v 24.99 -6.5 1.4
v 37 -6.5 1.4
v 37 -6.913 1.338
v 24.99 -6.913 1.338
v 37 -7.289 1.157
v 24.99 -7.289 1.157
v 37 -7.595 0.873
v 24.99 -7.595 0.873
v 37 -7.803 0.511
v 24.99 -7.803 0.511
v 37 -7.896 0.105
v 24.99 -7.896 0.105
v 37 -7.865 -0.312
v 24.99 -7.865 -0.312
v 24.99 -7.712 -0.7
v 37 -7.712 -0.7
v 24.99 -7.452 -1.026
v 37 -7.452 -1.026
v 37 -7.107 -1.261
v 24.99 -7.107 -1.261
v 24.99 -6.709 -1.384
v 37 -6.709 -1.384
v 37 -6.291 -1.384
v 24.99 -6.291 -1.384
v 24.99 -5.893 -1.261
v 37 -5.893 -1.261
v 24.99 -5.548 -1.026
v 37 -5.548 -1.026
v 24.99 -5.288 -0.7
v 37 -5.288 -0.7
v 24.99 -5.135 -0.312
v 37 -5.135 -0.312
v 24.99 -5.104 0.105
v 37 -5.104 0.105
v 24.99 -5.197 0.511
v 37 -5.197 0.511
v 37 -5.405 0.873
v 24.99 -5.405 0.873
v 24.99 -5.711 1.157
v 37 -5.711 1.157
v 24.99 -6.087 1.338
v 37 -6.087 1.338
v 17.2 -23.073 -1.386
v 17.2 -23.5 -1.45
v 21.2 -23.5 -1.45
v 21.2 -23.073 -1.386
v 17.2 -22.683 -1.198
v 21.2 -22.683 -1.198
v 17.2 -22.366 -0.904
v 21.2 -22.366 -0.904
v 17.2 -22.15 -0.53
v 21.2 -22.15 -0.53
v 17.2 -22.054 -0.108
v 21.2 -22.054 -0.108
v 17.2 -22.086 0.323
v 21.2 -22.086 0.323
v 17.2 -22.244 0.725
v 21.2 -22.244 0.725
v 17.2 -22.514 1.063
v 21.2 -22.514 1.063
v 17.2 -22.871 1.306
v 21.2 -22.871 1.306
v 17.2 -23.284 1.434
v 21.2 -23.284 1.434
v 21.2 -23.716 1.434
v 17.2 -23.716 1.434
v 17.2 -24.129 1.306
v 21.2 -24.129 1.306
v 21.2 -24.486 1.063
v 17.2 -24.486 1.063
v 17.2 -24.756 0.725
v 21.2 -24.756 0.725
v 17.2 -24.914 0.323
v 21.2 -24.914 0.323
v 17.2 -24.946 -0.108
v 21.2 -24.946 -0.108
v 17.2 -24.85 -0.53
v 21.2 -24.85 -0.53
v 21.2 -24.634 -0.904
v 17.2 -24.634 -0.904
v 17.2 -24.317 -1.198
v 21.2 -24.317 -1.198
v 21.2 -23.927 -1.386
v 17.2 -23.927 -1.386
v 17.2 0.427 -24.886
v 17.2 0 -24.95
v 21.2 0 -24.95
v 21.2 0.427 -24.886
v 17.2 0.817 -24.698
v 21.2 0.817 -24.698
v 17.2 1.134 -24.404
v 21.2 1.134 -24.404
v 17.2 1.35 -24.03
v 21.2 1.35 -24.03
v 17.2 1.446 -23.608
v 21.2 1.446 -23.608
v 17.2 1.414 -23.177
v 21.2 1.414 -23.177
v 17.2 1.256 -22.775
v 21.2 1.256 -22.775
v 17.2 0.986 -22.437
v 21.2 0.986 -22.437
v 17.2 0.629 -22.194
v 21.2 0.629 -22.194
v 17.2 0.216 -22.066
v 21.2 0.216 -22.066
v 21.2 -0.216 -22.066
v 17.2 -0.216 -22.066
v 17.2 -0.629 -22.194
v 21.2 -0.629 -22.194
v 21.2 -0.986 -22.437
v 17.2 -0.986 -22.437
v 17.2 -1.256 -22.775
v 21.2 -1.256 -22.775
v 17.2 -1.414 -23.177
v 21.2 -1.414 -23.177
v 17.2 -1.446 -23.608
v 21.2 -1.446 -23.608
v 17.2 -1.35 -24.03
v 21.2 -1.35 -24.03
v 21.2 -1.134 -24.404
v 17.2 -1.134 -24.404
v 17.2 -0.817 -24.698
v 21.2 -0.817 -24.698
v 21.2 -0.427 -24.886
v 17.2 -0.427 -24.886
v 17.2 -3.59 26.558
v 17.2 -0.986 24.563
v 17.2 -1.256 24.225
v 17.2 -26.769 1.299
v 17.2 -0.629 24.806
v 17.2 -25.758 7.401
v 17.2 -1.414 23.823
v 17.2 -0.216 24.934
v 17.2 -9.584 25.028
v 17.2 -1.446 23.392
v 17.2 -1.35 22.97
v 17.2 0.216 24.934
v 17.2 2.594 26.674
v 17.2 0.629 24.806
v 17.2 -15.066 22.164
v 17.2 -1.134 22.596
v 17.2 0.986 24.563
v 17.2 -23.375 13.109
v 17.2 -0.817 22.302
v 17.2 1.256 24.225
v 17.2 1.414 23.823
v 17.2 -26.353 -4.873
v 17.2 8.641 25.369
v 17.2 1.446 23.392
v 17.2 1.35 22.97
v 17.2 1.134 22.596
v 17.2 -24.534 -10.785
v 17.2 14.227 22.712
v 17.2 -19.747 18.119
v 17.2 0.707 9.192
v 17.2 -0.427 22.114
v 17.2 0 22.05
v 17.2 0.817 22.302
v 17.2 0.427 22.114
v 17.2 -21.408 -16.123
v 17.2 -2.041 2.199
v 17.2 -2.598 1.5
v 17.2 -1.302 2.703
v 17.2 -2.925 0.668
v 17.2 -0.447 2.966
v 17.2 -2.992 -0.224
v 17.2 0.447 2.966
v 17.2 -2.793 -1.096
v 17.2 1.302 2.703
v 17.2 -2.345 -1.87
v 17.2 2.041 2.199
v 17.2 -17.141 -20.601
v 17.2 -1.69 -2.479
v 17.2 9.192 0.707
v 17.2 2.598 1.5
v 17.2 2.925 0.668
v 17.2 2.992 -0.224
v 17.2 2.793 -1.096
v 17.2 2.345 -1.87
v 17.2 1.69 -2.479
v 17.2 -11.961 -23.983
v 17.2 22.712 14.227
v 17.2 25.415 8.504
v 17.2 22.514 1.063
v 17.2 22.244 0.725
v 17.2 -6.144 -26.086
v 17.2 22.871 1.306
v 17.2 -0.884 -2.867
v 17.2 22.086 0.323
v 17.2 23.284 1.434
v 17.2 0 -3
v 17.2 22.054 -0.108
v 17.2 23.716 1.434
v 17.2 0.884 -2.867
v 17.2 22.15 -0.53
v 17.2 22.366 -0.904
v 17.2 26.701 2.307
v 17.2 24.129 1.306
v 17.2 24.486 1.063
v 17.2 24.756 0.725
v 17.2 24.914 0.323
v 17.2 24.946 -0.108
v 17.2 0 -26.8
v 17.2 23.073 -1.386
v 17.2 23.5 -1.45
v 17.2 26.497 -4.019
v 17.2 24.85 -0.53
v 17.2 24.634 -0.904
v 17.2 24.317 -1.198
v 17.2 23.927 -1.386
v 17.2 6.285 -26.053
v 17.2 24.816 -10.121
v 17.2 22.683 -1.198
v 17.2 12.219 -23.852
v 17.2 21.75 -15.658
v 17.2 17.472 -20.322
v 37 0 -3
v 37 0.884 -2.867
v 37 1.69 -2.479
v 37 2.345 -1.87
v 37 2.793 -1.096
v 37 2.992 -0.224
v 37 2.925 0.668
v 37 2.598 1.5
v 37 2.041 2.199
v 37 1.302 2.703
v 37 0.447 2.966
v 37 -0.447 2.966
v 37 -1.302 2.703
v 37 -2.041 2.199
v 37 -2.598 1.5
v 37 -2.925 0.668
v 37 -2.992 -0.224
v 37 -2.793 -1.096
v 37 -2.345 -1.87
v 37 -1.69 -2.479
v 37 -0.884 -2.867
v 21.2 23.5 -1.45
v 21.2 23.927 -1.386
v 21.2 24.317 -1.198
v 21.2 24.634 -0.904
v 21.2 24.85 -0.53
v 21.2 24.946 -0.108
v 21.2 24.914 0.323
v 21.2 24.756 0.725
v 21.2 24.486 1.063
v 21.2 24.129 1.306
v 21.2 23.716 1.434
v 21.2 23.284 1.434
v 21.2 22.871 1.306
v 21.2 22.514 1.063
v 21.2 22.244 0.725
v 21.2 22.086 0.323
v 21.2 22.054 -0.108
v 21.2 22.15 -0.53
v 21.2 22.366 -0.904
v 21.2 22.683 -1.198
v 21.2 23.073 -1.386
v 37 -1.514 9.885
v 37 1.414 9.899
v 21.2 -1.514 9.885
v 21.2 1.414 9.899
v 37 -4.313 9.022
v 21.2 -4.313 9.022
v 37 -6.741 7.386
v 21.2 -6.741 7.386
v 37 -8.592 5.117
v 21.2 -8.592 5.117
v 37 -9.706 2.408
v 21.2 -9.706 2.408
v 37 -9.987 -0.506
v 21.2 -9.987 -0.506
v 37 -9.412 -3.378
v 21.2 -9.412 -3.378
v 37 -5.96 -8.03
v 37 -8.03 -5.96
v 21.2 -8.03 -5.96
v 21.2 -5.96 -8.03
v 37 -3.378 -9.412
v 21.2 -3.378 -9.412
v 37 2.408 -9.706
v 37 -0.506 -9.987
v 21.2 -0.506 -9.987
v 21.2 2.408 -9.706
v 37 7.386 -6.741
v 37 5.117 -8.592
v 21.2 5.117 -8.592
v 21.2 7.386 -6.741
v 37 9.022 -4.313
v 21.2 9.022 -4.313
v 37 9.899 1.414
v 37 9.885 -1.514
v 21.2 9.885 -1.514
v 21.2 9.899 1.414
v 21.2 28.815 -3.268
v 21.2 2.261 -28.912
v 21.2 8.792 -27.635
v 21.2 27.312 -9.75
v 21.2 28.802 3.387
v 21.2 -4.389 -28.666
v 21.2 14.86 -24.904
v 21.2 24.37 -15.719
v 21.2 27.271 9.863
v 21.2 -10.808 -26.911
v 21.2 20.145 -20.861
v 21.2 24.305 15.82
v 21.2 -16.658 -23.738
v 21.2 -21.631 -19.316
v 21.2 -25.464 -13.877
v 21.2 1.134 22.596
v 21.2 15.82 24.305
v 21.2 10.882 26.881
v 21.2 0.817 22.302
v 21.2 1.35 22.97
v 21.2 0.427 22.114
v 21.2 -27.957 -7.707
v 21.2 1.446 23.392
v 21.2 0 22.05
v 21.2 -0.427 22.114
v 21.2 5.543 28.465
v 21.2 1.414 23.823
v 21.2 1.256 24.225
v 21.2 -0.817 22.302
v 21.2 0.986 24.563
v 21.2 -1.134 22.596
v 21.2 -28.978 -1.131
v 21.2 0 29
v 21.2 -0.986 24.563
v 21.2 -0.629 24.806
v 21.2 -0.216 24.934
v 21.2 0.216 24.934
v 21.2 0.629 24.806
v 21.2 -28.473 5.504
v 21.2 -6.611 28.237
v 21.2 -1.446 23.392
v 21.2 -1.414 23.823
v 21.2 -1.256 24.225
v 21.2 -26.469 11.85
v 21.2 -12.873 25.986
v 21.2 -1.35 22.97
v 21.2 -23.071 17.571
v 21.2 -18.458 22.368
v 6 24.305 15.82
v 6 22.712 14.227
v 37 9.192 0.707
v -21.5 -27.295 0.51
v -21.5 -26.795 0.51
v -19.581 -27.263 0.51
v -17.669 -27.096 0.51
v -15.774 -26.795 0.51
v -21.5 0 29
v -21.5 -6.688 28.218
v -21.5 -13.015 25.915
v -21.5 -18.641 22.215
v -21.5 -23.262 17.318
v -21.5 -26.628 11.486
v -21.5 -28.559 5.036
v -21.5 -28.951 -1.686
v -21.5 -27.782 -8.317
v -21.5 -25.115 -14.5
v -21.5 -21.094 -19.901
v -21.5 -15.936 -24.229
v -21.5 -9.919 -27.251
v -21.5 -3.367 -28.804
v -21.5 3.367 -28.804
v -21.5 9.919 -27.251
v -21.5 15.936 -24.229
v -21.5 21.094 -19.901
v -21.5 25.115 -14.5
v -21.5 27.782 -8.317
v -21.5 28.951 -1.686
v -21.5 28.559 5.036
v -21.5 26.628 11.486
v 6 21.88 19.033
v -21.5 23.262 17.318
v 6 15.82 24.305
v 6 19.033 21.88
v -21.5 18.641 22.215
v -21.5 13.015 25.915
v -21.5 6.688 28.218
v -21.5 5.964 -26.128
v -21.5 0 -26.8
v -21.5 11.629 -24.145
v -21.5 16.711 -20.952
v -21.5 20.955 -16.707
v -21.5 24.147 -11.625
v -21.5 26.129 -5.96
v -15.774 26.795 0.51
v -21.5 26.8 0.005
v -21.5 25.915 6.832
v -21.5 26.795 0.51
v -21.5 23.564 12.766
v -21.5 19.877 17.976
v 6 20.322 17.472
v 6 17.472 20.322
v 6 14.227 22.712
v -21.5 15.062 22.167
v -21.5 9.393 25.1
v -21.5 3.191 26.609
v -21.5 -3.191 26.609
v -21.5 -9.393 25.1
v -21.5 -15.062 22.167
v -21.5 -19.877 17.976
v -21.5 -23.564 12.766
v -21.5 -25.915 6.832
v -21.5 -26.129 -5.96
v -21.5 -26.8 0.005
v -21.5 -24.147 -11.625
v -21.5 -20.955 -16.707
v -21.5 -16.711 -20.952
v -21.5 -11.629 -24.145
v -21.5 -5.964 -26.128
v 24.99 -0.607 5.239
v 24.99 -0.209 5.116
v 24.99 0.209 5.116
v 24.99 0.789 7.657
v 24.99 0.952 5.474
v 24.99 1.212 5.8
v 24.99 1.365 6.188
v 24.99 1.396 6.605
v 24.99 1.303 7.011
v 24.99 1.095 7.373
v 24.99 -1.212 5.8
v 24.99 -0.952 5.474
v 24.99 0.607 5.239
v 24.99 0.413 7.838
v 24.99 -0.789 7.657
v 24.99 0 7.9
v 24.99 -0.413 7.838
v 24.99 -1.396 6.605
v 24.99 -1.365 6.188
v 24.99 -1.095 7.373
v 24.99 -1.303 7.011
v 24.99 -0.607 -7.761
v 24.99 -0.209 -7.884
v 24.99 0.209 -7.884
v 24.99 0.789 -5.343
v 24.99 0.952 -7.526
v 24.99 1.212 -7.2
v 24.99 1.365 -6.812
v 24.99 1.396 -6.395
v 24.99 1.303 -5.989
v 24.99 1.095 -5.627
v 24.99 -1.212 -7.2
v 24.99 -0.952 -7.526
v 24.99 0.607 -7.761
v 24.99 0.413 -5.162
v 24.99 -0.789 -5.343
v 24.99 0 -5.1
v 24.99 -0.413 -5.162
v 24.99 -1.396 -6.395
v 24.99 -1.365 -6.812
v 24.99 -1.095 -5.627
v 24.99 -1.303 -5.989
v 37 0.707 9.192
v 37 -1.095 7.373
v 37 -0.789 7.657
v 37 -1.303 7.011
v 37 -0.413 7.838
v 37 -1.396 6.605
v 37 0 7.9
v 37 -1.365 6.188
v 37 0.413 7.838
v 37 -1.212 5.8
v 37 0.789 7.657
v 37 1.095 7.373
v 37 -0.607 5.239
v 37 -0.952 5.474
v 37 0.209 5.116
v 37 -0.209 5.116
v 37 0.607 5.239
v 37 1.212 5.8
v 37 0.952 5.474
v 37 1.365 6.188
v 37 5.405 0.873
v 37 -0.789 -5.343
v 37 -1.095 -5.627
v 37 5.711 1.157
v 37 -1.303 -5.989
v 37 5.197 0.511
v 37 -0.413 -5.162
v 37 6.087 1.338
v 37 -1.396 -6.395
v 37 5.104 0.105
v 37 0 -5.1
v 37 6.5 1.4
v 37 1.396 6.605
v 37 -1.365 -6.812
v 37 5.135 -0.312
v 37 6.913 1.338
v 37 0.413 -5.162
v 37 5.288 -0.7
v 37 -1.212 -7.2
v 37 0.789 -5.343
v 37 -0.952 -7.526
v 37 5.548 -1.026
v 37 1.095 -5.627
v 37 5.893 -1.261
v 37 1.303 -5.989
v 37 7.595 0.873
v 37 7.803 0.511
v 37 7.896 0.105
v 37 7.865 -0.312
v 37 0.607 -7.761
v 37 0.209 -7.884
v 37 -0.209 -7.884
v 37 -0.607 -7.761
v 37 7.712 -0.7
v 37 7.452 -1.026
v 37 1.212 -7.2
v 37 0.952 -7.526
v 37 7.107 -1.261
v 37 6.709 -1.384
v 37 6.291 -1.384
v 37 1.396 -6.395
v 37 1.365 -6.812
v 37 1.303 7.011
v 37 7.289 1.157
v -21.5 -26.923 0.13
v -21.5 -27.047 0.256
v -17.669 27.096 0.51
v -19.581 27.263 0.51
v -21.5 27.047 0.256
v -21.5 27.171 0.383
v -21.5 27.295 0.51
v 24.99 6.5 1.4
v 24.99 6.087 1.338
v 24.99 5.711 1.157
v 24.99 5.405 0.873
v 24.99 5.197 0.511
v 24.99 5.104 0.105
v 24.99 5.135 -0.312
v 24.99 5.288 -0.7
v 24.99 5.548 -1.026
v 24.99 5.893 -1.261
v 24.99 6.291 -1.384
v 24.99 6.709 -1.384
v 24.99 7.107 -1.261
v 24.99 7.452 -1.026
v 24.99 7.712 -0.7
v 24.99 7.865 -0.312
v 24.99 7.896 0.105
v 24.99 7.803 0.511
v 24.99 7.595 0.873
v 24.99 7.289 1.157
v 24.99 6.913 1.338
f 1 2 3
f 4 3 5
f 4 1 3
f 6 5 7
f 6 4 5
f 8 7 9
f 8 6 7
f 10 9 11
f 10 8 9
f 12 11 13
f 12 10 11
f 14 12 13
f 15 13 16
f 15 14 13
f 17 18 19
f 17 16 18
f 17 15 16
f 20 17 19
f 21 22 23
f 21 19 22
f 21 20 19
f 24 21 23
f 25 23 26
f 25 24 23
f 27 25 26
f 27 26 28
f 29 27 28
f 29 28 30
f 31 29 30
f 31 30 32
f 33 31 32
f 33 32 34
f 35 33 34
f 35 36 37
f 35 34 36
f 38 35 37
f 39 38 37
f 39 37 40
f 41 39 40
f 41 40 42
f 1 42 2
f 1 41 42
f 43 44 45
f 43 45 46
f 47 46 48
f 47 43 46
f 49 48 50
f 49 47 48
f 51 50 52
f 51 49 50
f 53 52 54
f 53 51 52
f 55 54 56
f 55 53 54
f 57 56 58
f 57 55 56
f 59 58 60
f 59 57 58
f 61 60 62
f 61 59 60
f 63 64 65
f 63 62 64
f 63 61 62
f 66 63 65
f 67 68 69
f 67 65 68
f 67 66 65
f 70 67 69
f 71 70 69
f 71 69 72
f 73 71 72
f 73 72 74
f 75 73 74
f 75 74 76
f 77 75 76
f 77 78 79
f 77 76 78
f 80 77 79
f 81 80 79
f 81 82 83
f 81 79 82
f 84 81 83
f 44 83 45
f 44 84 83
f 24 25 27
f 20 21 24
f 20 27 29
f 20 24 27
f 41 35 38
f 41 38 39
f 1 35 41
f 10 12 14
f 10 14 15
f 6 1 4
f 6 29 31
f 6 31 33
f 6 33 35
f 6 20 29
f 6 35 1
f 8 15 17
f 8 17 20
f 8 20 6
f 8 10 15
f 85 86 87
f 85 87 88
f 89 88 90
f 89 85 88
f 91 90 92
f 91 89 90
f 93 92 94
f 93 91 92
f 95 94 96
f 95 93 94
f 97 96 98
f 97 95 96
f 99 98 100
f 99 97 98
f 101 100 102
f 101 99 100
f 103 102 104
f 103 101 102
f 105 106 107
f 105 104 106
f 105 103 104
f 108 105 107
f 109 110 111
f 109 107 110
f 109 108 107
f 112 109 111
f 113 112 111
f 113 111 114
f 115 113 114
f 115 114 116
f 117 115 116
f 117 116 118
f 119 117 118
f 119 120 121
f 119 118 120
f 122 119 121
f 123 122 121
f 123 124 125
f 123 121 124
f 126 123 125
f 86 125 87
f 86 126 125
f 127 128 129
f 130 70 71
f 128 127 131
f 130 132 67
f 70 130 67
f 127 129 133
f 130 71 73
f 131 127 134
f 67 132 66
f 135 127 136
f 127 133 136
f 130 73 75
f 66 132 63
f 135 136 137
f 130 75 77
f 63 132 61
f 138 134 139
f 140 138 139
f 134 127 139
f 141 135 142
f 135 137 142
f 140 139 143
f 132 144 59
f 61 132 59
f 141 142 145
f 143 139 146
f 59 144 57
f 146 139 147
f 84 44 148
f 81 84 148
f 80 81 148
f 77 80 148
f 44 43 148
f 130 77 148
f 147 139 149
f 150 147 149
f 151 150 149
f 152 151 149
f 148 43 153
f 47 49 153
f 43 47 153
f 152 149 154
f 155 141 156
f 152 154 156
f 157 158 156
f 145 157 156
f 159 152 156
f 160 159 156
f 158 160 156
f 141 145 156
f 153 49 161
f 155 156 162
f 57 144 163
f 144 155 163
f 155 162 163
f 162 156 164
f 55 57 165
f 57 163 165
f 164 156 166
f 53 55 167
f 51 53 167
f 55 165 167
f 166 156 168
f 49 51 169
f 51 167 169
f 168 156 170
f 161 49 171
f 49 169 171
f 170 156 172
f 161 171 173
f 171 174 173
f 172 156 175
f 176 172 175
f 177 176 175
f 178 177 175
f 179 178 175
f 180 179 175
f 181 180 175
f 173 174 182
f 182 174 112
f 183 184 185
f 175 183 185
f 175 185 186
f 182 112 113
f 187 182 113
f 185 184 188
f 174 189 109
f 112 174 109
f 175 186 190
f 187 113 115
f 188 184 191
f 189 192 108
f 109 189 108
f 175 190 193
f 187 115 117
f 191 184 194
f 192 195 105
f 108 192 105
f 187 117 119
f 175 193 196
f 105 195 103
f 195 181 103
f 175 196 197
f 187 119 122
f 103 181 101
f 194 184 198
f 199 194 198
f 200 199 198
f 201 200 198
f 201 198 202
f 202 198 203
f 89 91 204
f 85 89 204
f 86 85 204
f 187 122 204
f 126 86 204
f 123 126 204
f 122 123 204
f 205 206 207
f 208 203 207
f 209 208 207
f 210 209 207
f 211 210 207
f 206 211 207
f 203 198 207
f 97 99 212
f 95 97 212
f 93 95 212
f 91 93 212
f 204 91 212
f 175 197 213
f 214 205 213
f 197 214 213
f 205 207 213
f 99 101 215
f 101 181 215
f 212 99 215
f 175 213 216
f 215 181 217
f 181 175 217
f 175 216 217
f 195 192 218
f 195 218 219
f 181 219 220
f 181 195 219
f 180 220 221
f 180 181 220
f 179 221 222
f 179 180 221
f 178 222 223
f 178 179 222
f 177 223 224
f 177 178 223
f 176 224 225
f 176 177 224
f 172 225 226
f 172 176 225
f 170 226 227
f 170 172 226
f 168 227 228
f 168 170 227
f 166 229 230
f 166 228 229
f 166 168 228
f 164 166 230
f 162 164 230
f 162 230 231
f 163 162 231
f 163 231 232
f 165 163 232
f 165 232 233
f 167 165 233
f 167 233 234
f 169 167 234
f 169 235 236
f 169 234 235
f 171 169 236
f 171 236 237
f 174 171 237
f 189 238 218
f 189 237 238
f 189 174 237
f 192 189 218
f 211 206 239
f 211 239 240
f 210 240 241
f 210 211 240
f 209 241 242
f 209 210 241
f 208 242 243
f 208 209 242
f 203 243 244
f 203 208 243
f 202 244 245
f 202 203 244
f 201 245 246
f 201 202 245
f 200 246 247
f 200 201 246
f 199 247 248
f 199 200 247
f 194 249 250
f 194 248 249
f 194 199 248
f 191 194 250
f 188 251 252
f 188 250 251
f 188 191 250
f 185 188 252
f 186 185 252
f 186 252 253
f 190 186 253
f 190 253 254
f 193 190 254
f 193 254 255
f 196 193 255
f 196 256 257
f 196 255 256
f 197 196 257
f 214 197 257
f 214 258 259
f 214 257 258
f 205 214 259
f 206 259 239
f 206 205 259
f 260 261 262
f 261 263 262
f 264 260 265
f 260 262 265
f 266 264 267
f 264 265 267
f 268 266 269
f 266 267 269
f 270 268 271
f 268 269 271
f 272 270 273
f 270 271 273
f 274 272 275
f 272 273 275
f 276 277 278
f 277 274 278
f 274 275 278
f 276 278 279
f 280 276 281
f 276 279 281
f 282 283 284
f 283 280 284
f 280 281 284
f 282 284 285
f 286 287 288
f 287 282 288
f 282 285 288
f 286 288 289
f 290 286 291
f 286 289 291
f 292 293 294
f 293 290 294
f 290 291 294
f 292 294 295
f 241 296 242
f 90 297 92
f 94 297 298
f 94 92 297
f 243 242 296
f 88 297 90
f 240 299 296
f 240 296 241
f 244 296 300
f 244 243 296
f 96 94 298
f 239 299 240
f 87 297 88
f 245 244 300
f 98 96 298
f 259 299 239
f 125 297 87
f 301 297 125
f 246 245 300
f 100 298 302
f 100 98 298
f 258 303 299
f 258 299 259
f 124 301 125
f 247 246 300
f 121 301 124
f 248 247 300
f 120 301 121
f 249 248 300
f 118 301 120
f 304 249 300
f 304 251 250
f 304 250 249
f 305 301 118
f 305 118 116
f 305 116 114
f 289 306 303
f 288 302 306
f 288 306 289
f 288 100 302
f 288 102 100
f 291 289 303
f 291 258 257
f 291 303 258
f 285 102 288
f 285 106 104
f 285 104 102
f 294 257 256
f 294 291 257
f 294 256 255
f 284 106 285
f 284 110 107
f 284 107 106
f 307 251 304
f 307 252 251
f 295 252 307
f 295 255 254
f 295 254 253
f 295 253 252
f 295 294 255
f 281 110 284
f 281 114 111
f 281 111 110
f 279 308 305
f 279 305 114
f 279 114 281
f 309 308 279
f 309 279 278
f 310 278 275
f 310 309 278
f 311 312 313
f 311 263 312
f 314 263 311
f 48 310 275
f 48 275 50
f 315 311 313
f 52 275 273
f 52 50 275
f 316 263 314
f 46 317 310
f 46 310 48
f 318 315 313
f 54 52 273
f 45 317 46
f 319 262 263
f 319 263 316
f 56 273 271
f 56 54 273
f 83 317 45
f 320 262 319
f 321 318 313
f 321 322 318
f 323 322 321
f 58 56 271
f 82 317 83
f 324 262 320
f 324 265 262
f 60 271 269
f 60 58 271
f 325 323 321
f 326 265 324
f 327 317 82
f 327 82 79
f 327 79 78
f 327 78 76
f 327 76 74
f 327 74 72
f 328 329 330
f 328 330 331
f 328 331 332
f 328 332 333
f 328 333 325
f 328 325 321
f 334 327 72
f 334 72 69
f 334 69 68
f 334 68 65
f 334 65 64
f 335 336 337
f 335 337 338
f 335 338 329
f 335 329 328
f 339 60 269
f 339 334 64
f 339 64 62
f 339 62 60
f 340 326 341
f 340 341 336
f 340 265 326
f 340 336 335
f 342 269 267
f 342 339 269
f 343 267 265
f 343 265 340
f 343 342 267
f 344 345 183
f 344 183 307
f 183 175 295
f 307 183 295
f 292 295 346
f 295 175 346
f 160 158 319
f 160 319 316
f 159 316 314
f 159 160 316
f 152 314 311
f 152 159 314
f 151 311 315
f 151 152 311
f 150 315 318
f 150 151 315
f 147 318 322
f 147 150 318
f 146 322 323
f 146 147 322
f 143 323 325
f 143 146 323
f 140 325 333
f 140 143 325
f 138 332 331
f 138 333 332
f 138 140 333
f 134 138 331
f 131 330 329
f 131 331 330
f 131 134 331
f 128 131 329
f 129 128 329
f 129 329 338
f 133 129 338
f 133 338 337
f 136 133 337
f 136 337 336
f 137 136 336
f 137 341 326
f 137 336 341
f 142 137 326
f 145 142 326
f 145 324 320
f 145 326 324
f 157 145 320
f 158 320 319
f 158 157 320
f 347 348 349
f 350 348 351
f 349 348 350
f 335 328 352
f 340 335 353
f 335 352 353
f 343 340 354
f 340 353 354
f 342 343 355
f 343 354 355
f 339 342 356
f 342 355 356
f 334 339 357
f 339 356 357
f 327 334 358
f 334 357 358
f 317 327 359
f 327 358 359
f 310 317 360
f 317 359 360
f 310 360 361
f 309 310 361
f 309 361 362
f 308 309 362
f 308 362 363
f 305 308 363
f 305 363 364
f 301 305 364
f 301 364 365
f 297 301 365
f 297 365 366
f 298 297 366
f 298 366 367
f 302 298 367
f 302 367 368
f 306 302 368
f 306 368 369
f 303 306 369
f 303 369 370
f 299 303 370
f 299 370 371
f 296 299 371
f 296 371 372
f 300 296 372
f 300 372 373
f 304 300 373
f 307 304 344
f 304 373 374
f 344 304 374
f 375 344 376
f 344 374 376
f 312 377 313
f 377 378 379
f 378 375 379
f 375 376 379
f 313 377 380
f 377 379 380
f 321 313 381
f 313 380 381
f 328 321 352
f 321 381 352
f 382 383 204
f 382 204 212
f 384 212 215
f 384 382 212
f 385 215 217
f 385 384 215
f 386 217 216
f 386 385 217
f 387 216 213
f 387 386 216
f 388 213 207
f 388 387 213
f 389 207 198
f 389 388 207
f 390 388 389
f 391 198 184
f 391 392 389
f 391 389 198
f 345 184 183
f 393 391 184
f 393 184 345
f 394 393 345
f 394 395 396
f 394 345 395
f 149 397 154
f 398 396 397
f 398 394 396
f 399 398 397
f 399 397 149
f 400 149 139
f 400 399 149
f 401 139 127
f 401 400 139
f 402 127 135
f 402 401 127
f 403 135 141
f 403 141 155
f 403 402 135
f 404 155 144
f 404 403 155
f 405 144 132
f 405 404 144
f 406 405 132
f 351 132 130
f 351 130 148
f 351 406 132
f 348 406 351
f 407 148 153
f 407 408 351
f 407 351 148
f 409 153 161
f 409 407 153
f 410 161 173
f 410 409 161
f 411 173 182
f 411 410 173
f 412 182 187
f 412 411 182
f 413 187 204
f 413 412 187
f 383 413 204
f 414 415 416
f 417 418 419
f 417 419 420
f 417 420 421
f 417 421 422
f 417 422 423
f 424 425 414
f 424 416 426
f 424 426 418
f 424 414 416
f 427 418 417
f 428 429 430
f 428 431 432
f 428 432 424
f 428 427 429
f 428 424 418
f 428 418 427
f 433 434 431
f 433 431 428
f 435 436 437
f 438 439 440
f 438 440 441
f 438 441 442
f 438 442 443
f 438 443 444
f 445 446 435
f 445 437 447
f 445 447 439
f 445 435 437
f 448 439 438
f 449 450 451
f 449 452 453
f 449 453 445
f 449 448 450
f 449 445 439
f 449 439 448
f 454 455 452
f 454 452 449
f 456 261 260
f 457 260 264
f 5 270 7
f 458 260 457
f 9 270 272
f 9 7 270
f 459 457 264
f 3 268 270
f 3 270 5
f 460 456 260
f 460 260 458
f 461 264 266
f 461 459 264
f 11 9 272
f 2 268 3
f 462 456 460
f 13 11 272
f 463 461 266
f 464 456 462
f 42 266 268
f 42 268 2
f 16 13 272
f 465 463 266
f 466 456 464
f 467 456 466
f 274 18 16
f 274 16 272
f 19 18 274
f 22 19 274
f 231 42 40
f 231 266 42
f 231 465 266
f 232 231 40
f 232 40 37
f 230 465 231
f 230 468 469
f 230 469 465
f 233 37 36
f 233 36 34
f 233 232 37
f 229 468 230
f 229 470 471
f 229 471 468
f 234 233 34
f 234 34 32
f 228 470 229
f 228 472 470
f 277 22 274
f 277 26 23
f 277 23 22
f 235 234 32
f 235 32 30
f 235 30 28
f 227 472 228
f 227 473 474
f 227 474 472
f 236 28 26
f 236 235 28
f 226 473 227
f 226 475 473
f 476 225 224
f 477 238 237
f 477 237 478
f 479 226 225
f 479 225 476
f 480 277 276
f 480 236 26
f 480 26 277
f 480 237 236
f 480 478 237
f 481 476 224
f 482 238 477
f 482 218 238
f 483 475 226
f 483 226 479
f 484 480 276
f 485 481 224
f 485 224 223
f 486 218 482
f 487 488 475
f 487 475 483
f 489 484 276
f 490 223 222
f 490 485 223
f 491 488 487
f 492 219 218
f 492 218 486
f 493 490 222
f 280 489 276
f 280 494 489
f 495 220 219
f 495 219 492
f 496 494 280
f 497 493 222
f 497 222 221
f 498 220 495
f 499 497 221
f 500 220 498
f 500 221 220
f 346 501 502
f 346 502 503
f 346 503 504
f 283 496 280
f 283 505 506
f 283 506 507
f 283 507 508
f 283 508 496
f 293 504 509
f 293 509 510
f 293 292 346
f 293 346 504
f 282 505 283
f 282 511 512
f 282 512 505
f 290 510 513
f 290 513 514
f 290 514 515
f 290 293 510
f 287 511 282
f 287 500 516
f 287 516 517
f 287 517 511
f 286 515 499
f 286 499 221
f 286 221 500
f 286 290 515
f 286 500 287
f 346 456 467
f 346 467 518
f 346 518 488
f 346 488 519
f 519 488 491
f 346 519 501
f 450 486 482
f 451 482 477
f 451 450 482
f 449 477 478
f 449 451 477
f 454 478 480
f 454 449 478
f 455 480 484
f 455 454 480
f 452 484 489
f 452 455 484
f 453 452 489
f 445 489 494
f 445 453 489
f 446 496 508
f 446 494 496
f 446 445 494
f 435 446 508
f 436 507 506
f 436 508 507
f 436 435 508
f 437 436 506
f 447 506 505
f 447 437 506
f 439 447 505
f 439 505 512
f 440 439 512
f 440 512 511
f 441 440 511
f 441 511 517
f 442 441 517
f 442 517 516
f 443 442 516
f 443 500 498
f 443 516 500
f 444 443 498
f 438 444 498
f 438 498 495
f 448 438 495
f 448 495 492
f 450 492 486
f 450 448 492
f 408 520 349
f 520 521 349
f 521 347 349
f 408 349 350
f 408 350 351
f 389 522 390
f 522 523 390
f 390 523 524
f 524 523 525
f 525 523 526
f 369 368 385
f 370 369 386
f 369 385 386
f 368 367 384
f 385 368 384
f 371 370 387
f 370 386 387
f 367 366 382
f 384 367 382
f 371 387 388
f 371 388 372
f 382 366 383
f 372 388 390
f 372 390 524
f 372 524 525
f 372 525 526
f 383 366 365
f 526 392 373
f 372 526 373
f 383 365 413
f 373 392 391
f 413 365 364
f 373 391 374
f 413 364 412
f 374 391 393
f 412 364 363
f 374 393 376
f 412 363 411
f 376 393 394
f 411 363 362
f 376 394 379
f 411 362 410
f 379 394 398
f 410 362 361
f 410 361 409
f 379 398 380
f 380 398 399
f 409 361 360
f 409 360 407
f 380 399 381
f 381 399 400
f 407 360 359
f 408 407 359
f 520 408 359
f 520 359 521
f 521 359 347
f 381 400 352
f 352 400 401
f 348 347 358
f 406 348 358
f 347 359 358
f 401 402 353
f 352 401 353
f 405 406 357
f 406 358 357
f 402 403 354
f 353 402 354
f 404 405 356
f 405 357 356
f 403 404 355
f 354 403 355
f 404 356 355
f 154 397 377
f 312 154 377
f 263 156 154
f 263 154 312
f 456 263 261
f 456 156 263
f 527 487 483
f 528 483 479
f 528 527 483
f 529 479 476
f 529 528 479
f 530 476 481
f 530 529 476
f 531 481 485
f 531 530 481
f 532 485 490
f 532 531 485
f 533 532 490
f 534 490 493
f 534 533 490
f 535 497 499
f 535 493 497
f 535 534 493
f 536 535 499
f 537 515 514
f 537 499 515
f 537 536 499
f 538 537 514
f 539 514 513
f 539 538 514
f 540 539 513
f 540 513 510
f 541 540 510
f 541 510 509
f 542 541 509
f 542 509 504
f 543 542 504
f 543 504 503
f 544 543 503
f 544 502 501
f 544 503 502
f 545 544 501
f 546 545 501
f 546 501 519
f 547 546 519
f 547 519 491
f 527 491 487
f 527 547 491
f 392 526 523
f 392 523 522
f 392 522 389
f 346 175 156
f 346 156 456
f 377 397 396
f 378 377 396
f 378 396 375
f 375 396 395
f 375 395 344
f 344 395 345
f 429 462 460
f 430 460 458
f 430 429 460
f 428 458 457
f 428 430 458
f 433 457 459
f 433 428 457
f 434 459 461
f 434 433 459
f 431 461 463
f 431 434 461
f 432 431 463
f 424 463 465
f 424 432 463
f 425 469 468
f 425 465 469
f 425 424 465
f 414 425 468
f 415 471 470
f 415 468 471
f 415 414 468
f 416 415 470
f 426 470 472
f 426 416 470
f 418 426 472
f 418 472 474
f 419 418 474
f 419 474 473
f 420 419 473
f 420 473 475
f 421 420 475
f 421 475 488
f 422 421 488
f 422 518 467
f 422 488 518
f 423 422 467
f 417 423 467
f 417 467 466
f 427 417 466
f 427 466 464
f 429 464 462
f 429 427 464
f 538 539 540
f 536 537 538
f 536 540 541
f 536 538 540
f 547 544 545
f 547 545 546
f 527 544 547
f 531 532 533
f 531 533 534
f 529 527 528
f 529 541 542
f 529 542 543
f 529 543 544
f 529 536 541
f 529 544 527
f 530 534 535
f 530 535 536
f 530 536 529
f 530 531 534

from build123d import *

# Parameters (mm, degrees)
F_0000_CYLINDER_SKETCH_R     = 29
F_0000_CYLINDER_DEPTH        = 42.7
F_0000_CYLINDER_ROTATE_ANGLE = 90
F_0002_CYLINDER_SKETCH_R     = 26.8
F_0002_CYLINDER_DEPTH        = 39.7
F_0002_CYLINDER_ROTATE_ANGLE = 90
F_0005_CYLINDER_SKETCH_R     = 10
F_0005_CYLINDER_DEPTH        = 16.3
F_0005_CYLINDER_ROTATE_ANGLE = 90
F_0008_CYLINDER_SKETCH_R     = 3
F_0008_CYLINDER_DEPTH        = 20.9
F_0008_CYLINDER_ROTATE_ANGLE = 90
F_0011_CYLINDER_SKETCH_R     = 1.45
F_0011_CYLINDER_DEPTH        = 4.2
F_0011_CYLINDER_ROTATE_ANGLE = 90
F_0015_CYLINDER_SKETCH_R     = 1.45
F_0015_CYLINDER_DEPTH        = 4.2
F_0015_CYLINDER_ROTATE_ANGLE = 90
F_0019_CYLINDER_SKETCH_R     = 1.45
F_0019_CYLINDER_DEPTH        = 4.2
F_0019_CYLINDER_ROTATE_ANGLE = 90
F_0023_CYLINDER_SKETCH_R     = 1.45
F_0023_CYLINDER_DEPTH        = 4.2
F_0023_CYLINDER_ROTATE_ANGLE = 90
F_0027_BOX_SKETCH_W          = 31.1
F_0027_BOX_SKETCH_H          = 12
F_0027_BOX_DEPTH             = 28
F_0027_BOX_ROTATE_ANGLE      = 45
F_0031_CYLINDER_SKETCH_R     = 1.4
F_0031_CYLINDER_DEPTH        = 12.02
F_0031_CYLINDER_ROTATE_ANGLE = 90
F_0035_CYLINDER_SKETCH_R     = 1.4
F_0035_CYLINDER_DEPTH        = 12.02
F_0035_CYLINDER_ROTATE_ANGLE = 90
F_0039_CYLINDER_SKETCH_R     = 1.4
F_0039_CYLINDER_DEPTH        = 12.02
F_0039_CYLINDER_ROTATE_ANGLE = 90
F_0043_CYLINDER_SKETCH_R     = 1.4
F_0043_CYLINDER_DEPTH        = 12.02
F_0043_CYLINDER_ROTATE_ANGLE = 90
F_0047_CONE_ROTATE_ANGLE     = 120


with BuildPart() as part:
    # 0000_cylinder_Sketch → 0000_cylinder (new body)
    with BuildSketch(Plane.XY):
        with Locations(Location((0, 0, 0), (0, 0, 180))):
            Circle(F_0000_CYLINDER_SKETCH_R)
    extrude(amount=F_0000_CYLINDER_DEPTH)


with BuildPart() as part_1:
    # 0000_cylinder_Rotate: moved
    add(part.part.rotate(Axis((0, 0, 0), (0, 1, 0)), F_0000_CYLINDER_ROTATE_ANGLE))


with BuildPart() as part_2:
    # 0000_cylinder_Translate: moved
    add(part_1.part.moved(Location((-21.5, 0, 0))))


with BuildPart() as body_2:
    # 0002_cylinder_Sketch → 0002_cylinder (new body)
    with BuildSketch(Plane.XY):
        Circle(F_0002_CYLINDER_SKETCH_R)
    extrude(amount=F_0002_CYLINDER_DEPTH)


with BuildPart() as body_2_1:
    # 0002_cylinder_Rotate: moved
    add(body_2.part.rotate(Axis((0, 0, 0), (0, 1, 0)), F_0002_CYLINDER_ROTATE_ANGLE))


with BuildPart() as body_2_2:
    # 0002_cylinder_Translate: moved
    add(body_2_1.part.moved(Location((-22.5, 0, 0))))


with BuildPart() as part_3:
    add(part_2.part)

    # 0004_sub: cut body 2
    add(body_2_2.part, mode=Mode.SUBTRACT)


with BuildPart() as body_2_2_1:
    # 0005_cylinder_Sketch → 0005_cylinder (new body)
    with BuildSketch(Plane.XY):
        Circle(F_0005_CYLINDER_SKETCH_R)
    extrude(amount=F_0005_CYLINDER_DEPTH)


with BuildPart() as body_2_2_2:
    # 0005_cylinder_Rotate: moved
    add(body_2_2_1.part.rotate(Axis((0, 0, 0), (0, 1, 0)), F_0005_CYLINDER_ROTATE_ANGLE))


with BuildPart() as body_2_2_3:
    # 0005_cylinder_Translate: moved
    add(body_2_2_2.part.moved(Location((20.7, 0, 0))))


with BuildPart() as part_4:
    add(part_3.part)

    # 0007_add: union body 2 2
    add(body_2_2_3.part)


with BuildPart() as body_2_3:
    # 0008_cylinder_Sketch → 0008_cylinder (new body)
    with BuildSketch(Plane.XY):
        Circle(F_0008_CYLINDER_SKETCH_R)
    extrude(amount=F_0008_CYLINDER_DEPTH)


with BuildPart() as body_2_3_1:
    # 0008_cylinder_Rotate: moved
    add(body_2_3.part.rotate(Axis((0, 0, 0), (0, 1, 0)), F_0008_CYLINDER_ROTATE_ANGLE))


with BuildPart() as body_2_3_2:
    # 0008_cylinder_Translate: moved
    add(body_2_3_1.part.moved(Location((17.1, 0, 0))))


with BuildPart() as part_5:
    add(part_4.part)

    # 0010_sub: cut body 2 3
    add(body_2_3_2.part, mode=Mode.SUBTRACT)


with BuildPart() as body_2_4:
    # 0011_cylinder_Sketch → 0011_cylinder (new body)
    with BuildSketch(Plane.XY):
        Circle(F_0011_CYLINDER_SKETCH_R)
    extrude(amount=F_0011_CYLINDER_DEPTH)


with BuildPart() as body_2_4_1:
    # 0011_cylinder_Rotate: moved
    add(body_2_4.part.rotate(Axis((0, 0, 0), (0, 1, 0)), F_0011_CYLINDER_ROTATE_ANGLE))


with BuildPart() as body_2_4_2:
    # 0011_cylinder_Translate: moved
    add(body_2_4_1.part.moved(Location((17.1, 23.5, 0))))


with BuildPart() as part_6:
    add(part_5.part)

    # 0014_sub: cut body 2 4
    add(body_2_4_2.part, mode=Mode.SUBTRACT)


with BuildPart() as body_2_5:
    # 0015_cylinder_Sketch → 0015_cylinder (new body)
    with BuildSketch(Plane.XY):
        Circle(F_0015_CYLINDER_SKETCH_R)
    extrude(amount=F_0015_CYLINDER_DEPTH)


with BuildPart() as body_2_5_1:
    # 0015_cylinder_Rotate: moved
    add(body_2_5.part.rotate(Axis((0, 0, 0), (0, 1, 0)), F_0015_CYLINDER_ROTATE_ANGLE))


with BuildPart() as body_2_5_2:
    # 0015_cylinder_Translate: moved
    add(body_2_5_1.part.moved(Location((17.1, 0, 23.5))))


with BuildPart() as part_7:
    add(part_6.part)

    # 0018_sub: cut body 2 5
    add(body_2_5_2.part, mode=Mode.SUBTRACT)


with BuildPart() as body_2_6:
    # 0019_cylinder_Sketch → 0019_cylinder (new body)
    with BuildSketch(Plane.XY):
        Circle(F_0019_CYLINDER_SKETCH_R)
    extrude(amount=F_0019_CYLINDER_DEPTH)


with BuildPart() as body_2_6_1:
    # 0019_cylinder_Rotate: moved
    add(body_2_6.part.rotate(Axis((0, 0, 0), (0, 1, 0)), F_0019_CYLINDER_ROTATE_ANGLE))


with BuildPart() as body_2_6_2:
    # 0019_cylinder_Translate: moved
    add(body_2_6_1.part.moved(Location((17.1, -23.5, 0))))


with BuildPart() as part_8:
    add(part_7.part)

    # 0022_sub: cut body 2 6
    add(body_2_6_2.part, mode=Mode.SUBTRACT)


with BuildPart() as body_2_7:
    # 0023_cylinder_Sketch → 0023_cylinder (new body)
    with BuildSketch(Plane.XY):
        Circle(F_0023_CYLINDER_SKETCH_R)
    extrude(amount=F_0023_CYLINDER_DEPTH)


with BuildPart() as body_2_7_1:
    # 0023_cylinder_Rotate: moved
    add(body_2_7.part.rotate(Axis((0, 0, 0), (0, 1, 0)), F_0023_CYLINDER_ROTATE_ANGLE))


with BuildPart() as body_2_7_2:
    # 0023_cylinder_Translate: moved
    add(body_2_7_1.part.moved(Location((17.1, 0, -23.5))))


with BuildPart() as part_9:
    add(part_8.part)

    # 0026_sub: cut body 2 7
    add(body_2_7_2.part, mode=Mode.SUBTRACT)


with BuildPart() as body_2_8:
    # 0027_box_Sketch → 0027_box (new body)
    with BuildSketch(Plane.XY):
        with Locations((15.55, 6)):
            Rectangle(F_0027_BOX_SKETCH_W, F_0027_BOX_SKETCH_H)
    extrude(amount=F_0027_BOX_DEPTH)


with BuildPart() as body_2_8_1:
    # 0027_box_Rotate: moved
    add(body_2_8.part.rotate(Axis((0, 0, 0), (-1, 0, 0)), F_0027_BOX_ROTATE_ANGLE))


with BuildPart() as body_2_8_2:
    # 0027_box_Translate: moved
    add(body_2_8_1.part.moved(Location((6, 0.707106781, 9.192388155))))


with BuildPart() as part_10:
    add(part_9.part)

    # 0030_sub: cut body 2 8
    add(body_2_8_2.part, mode=Mode.SUBTRACT)


with BuildPart() as body_2_9:
    # 0031_cylinder_Sketch → 0031_cylinder (new body)
    with BuildSketch(Plane.XY):
        with Locations(Location((0, 0, 0), (0, 0, 180))):
            Circle(F_0031_CYLINDER_SKETCH_R)
    extrude(amount=F_0031_CYLINDER_DEPTH)


with BuildPart() as body_2_9_1:
    # 0031_cylinder_Rotate: moved
    add(body_2_9.part.rotate(Axis((0, 0, 0), (0, 1, 0)), F_0031_CYLINDER_ROTATE_ANGLE))


with BuildPart() as body_2_9_2:
    # 0031_cylinder_Translate: moved
    add(body_2_9_1.part.moved(Location((24.99, 6.5, 0))))


with BuildPart() as part_11:
    add(part_10.part)

    # 0034_sub: cut body 2 9
    add(body_2_9_2.part, mode=Mode.SUBTRACT)


with BuildPart() as body_2_10:
    # 0035_cylinder_Sketch → 0035_cylinder (new body)
    with BuildSketch(Plane.XY):
        with Locations(Location((0, 0, 0), (0, 0, 180))):
            Circle(F_0035_CYLINDER_SKETCH_R)
    extrude(amount=F_0035_CYLINDER_DEPTH)


with BuildPart() as body_2_10_1:
    # 0035_cylinder_Rotate: moved
    add(body_2_10.part.rotate(Axis((0, 0, 0), (0, 1, 0)), F_0035_CYLINDER_ROTATE_ANGLE))


with BuildPart() as body_2_10_2:
    # 0035_cylinder_Translate: moved
    add(body_2_10_1.part.moved(Location((24.99, 0, 6.5))))


with BuildPart() as part_12:
    add(part_11.part)

    # 0038_sub: cut body 2 10
    add(body_2_10_2.part, mode=Mode.SUBTRACT)


with BuildPart() as body_2_11:
    # 0039_cylinder_Sketch → 0039_cylinder (new body)
    with BuildSketch(Plane.XY):
        with Locations(Location((0, 0, 0), (0, 0, 180))):
            Circle(F_0039_CYLINDER_SKETCH_R)
    extrude(amount=F_0039_CYLINDER_DEPTH)


with BuildPart() as body_2_11_1:
    # 0039_cylinder_Rotate: moved
    add(body_2_11.part.rotate(Axis((0, 0, 0), (0, 1, 0)), F_0039_CYLINDER_ROTATE_ANGLE))


with BuildPart() as body_2_11_2:
    # 0039_cylinder_Translate: moved
    add(body_2_11_1.part.moved(Location((24.99, -6.5, 0))))


with BuildPart() as part_13:
    add(part_12.part)

    # 0042_sub: cut body 2 11
    add(body_2_11_2.part, mode=Mode.SUBTRACT)


with BuildPart() as body_2_12:
    # 0043_cylinder_Sketch → 0043_cylinder (new body)
    with BuildSketch(Plane.XY):
        with Locations(Location((0, 0, 0), (0, 0, 180))):
            Circle(F_0043_CYLINDER_SKETCH_R)
    extrude(amount=F_0043_CYLINDER_DEPTH)


with BuildPart() as body_2_12_1:
    # 0043_cylinder_Rotate: moved
    add(body_2_12.part.rotate(Axis((0, 0, 0), (0, 1, 0)), F_0043_CYLINDER_ROTATE_ANGLE))


with BuildPart() as body_2_12_2:
    # 0043_cylinder_Translate: moved
    add(body_2_12_1.part.moved(Location((24.99, 0, -6.5))))


with BuildPart() as part_14:
    add(part_13.part)

    # 0046_sub: cut body 2 12
    add(body_2_12_2.part, mode=Mode.SUBTRACT)


with BuildPart() as body_2_13:
    # 0047_cone_Sketch → 0047_cone (revolve)
    with BuildSketch(Plane.XY, mode=Mode.PRIVATE) as f_0047_cone_sk:
        Polygon((0, 0), (26.8, 0), (27.3, 0.51), (0, 0.51), align=None)
    revolve(f_0047_cone_sk.sketch.rotate(Axis((0, -100, 0), (0, 1, 0)), 90), axis=Axis((0, -100, 0), (0, 1, 0)))


with BuildPart() as body_2_13_1:
    # 0047_cone_Rotate: moved
    add(body_2_13.part.rotate(Axis((0, 0, 0), (0.5773502691896258, -0.5773502691896257, -0.5773502691896257)), F_0047_CONE_ROTATE_ANGLE))


with BuildPart() as body_2_13_2:
    # 0047_cone_Translate: moved
    add(body_2_13_1.part.moved(Location((-21, 0, 0))))


with BuildPart() as part_15:
    add(part_14.part)

    # 0050_sub: cut body 2 13
    add(body_2_13_2.part, mode=Mode.SUBTRACT)


solid = part_15.part
